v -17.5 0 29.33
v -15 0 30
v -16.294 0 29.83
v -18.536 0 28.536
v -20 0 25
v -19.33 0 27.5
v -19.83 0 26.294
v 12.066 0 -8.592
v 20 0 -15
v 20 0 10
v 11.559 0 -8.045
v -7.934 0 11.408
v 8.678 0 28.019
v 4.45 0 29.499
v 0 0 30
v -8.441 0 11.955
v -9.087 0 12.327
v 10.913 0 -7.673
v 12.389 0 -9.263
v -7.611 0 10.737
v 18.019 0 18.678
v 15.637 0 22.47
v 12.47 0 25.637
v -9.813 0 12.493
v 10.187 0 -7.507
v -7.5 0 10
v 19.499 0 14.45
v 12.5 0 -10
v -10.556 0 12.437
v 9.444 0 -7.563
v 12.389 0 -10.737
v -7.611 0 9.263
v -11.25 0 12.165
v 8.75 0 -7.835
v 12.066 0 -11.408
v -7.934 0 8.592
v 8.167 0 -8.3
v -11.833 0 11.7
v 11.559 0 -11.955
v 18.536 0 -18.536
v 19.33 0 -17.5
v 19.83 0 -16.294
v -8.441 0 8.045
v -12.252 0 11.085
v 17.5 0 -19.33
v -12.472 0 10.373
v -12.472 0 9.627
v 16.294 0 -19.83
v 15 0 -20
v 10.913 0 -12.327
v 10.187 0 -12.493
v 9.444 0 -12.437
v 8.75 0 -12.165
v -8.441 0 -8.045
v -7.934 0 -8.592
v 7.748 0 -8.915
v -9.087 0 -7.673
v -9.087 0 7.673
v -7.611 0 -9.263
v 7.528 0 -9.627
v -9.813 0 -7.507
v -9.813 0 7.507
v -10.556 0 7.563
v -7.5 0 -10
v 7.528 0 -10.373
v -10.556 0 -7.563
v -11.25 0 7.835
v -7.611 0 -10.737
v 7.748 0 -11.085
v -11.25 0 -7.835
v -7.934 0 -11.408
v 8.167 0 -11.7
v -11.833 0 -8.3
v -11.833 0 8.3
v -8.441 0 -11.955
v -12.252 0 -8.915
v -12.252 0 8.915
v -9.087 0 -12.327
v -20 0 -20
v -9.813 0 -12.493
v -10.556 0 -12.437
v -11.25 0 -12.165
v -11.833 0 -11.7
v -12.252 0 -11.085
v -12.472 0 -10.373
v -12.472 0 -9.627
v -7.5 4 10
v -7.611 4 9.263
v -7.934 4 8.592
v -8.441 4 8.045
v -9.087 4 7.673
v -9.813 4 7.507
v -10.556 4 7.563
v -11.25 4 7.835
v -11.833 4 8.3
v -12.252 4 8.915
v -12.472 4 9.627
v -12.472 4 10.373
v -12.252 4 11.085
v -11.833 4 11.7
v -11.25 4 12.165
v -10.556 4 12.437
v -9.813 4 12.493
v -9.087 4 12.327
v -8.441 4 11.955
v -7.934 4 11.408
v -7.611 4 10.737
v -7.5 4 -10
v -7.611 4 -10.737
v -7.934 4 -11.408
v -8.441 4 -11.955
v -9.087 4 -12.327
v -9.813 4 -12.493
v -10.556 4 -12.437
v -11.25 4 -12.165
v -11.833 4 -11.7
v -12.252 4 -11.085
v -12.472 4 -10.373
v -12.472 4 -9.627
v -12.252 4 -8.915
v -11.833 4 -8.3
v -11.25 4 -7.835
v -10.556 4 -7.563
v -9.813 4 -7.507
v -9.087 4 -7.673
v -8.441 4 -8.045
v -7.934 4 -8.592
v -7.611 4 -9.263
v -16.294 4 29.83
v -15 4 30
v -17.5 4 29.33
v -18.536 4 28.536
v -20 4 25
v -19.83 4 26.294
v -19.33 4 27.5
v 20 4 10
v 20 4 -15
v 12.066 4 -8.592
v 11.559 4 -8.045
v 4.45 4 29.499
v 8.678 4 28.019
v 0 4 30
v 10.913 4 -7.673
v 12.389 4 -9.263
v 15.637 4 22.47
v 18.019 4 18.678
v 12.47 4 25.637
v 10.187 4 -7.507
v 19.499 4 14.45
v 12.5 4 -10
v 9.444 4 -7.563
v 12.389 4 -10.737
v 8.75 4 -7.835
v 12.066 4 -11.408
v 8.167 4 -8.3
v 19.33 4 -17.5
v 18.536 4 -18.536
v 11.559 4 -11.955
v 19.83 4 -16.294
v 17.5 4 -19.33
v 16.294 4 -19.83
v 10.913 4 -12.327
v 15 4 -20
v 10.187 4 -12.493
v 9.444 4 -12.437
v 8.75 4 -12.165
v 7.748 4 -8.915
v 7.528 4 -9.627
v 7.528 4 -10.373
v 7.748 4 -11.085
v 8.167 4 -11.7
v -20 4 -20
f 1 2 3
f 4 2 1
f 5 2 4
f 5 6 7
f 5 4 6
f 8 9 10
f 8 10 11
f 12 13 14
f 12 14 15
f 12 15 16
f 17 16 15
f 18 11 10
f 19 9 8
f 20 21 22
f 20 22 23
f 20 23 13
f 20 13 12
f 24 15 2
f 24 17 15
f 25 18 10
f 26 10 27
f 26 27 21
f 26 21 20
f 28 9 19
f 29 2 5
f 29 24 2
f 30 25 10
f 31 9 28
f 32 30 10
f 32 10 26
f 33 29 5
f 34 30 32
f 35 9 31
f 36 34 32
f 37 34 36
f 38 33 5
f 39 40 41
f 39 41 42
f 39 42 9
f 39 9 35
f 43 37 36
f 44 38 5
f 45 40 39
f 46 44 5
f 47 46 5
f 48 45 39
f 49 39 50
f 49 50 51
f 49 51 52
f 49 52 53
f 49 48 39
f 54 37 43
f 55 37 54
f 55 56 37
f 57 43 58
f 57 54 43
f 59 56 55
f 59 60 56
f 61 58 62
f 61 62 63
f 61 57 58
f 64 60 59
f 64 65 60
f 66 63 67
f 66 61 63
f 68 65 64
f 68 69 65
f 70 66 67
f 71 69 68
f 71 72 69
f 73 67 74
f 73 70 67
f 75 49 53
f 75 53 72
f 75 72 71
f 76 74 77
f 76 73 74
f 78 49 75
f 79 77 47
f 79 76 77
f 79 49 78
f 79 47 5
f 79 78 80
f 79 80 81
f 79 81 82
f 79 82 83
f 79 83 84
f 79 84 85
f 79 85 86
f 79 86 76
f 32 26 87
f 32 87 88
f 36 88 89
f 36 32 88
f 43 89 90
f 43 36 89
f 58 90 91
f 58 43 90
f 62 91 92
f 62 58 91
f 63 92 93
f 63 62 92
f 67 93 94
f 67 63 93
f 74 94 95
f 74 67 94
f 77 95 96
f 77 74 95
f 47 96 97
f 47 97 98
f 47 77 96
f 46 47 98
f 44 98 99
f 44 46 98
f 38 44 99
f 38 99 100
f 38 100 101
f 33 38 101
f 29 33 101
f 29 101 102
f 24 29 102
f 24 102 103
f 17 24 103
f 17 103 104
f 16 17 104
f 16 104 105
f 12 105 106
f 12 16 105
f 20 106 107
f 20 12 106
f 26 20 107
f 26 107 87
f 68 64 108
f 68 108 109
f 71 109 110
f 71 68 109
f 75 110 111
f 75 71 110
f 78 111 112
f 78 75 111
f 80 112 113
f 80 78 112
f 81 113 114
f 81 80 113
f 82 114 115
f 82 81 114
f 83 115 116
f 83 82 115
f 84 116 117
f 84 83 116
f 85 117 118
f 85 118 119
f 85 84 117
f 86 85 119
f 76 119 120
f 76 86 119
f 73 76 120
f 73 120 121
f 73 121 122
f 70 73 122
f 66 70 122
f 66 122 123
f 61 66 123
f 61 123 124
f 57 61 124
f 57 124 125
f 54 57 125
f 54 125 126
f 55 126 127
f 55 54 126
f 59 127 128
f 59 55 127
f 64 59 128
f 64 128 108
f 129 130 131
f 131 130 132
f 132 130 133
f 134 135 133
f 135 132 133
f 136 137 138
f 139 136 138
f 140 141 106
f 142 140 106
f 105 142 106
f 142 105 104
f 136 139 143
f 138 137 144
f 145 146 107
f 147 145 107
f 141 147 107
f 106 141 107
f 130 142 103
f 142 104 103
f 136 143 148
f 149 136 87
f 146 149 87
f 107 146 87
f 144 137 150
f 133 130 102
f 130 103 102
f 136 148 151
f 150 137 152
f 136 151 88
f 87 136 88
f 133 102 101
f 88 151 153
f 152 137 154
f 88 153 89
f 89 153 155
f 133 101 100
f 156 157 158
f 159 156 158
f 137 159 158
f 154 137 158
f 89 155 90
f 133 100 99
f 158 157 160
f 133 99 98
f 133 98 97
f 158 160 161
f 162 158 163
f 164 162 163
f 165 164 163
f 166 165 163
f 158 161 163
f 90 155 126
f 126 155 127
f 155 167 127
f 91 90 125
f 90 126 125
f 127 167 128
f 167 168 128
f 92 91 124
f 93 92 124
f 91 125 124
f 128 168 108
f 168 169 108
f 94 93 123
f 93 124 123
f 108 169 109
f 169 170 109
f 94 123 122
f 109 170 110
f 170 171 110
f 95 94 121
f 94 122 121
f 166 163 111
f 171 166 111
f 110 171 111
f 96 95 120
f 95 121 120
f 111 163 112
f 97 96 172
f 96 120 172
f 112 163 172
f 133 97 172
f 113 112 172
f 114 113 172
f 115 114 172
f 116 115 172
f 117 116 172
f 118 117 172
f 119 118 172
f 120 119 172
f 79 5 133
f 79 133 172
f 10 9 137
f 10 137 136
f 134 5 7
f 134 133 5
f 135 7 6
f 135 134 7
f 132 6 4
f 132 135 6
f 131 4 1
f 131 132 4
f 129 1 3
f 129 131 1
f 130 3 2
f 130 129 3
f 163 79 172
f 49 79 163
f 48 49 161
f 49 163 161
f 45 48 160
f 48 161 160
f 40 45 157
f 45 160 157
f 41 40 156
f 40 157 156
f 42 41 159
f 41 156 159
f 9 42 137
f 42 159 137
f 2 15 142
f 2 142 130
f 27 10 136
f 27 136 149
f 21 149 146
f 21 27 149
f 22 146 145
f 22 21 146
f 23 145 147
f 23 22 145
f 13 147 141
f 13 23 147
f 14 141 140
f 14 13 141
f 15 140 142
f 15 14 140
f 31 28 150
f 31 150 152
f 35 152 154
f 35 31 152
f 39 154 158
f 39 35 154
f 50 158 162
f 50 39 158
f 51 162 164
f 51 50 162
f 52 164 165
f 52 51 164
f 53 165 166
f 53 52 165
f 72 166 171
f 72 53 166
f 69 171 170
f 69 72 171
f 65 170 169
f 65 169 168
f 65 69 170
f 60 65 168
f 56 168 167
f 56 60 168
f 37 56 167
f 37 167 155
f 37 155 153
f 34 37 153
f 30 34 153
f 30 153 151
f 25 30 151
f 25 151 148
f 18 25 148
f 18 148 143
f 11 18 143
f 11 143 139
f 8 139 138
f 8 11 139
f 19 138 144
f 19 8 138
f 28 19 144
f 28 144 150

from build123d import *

# Parameters (mm, degrees)
SKETCH1_R           = 2.5
BOSS_EXTRUDE1_DEPTH = 4
FILLET1_R           = 5


with BuildPart() as part:
    # Sketch1 → Boss-Extrude1 (new body)
    with BuildSketch(Plane(origin=(0, 0, 0), x_dir=(1, 0, 0), z_dir=(0, 1, 0))):
        with BuildLine():
            Line((-20, 20), (20, 20))
            Line((20, 20), (20, -10))
            ThreePointArc((20, -10), (14.142135624, -24.142135624), (0, -30))
            Line((0, -30), (-20, -30))
            Line((-20, -30), (-20, 20))
        make_face()
        with Locations((-10, 10)):
            Circle(SKETCH1_R, mode=Mode.SUBTRACT)
        with Locations((10, 10)):
            Circle(SKETCH1_R, mode=Mode.SUBTRACT)
        with Locations((-10, -10)):
            Circle(SKETCH1_R, mode=Mode.SUBTRACT)
    extrude(amount=BOSS_EXTRUDE1_DEPTH)

    # Fillet1
    fillet1_edges = [part.edges().sort_by_distance(p)[0] for p in [
        (20, 2, -20),
        (-20, 2, 30),
    ]]
    fillet(fillet1_edges, radius=FILLET1_R)


solid = part.part
